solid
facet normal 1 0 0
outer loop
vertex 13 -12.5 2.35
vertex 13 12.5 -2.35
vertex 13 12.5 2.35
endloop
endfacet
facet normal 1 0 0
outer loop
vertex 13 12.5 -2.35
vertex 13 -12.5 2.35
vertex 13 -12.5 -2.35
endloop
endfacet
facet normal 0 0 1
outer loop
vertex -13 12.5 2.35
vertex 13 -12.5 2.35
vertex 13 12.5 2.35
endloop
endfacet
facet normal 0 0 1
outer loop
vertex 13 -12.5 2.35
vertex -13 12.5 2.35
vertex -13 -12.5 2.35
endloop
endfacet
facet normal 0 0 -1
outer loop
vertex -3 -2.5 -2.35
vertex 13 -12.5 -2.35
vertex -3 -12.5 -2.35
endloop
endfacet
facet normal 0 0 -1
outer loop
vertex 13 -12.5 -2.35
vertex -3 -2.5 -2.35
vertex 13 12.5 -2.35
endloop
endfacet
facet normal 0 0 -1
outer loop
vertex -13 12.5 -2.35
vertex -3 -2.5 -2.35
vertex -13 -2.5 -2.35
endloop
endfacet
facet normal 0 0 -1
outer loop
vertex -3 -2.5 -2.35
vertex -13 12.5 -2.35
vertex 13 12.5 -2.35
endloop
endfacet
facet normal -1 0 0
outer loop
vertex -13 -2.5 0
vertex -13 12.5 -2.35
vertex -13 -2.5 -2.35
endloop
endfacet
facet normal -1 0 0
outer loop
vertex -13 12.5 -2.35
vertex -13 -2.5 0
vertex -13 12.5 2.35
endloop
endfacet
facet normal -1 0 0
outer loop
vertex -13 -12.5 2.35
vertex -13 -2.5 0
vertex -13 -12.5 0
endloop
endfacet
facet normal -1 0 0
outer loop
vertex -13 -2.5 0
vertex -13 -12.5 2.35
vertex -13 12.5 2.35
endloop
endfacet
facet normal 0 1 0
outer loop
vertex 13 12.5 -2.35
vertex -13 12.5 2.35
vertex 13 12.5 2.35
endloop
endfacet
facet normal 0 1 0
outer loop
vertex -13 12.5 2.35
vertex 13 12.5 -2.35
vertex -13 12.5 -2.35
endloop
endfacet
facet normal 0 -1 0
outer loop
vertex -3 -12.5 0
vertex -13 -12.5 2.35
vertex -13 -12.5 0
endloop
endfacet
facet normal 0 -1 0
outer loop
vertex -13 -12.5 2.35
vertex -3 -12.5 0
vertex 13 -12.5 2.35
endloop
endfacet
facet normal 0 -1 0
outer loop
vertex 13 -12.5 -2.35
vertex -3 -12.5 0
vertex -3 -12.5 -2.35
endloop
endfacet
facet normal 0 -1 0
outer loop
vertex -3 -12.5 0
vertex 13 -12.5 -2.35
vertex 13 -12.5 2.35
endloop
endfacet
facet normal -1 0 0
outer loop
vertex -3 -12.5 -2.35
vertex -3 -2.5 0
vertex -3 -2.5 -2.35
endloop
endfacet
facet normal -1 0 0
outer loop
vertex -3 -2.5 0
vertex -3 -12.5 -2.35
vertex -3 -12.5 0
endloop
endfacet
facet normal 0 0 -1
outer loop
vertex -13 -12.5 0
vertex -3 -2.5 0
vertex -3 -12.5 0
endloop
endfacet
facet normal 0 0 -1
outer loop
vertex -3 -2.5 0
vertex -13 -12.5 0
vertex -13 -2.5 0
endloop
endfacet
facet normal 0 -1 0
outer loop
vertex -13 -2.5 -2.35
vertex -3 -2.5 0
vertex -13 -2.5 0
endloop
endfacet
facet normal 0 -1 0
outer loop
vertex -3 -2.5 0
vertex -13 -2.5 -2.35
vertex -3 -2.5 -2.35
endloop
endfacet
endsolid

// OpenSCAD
module extrusion_bracket() {
    difference() {
        cube([26, 25, 4.7], center = true);
        translate([-13, -12.5, -2.35])
            cube([20, 20, 4.7], center = true);
    }
}

extrusion_bracket();
